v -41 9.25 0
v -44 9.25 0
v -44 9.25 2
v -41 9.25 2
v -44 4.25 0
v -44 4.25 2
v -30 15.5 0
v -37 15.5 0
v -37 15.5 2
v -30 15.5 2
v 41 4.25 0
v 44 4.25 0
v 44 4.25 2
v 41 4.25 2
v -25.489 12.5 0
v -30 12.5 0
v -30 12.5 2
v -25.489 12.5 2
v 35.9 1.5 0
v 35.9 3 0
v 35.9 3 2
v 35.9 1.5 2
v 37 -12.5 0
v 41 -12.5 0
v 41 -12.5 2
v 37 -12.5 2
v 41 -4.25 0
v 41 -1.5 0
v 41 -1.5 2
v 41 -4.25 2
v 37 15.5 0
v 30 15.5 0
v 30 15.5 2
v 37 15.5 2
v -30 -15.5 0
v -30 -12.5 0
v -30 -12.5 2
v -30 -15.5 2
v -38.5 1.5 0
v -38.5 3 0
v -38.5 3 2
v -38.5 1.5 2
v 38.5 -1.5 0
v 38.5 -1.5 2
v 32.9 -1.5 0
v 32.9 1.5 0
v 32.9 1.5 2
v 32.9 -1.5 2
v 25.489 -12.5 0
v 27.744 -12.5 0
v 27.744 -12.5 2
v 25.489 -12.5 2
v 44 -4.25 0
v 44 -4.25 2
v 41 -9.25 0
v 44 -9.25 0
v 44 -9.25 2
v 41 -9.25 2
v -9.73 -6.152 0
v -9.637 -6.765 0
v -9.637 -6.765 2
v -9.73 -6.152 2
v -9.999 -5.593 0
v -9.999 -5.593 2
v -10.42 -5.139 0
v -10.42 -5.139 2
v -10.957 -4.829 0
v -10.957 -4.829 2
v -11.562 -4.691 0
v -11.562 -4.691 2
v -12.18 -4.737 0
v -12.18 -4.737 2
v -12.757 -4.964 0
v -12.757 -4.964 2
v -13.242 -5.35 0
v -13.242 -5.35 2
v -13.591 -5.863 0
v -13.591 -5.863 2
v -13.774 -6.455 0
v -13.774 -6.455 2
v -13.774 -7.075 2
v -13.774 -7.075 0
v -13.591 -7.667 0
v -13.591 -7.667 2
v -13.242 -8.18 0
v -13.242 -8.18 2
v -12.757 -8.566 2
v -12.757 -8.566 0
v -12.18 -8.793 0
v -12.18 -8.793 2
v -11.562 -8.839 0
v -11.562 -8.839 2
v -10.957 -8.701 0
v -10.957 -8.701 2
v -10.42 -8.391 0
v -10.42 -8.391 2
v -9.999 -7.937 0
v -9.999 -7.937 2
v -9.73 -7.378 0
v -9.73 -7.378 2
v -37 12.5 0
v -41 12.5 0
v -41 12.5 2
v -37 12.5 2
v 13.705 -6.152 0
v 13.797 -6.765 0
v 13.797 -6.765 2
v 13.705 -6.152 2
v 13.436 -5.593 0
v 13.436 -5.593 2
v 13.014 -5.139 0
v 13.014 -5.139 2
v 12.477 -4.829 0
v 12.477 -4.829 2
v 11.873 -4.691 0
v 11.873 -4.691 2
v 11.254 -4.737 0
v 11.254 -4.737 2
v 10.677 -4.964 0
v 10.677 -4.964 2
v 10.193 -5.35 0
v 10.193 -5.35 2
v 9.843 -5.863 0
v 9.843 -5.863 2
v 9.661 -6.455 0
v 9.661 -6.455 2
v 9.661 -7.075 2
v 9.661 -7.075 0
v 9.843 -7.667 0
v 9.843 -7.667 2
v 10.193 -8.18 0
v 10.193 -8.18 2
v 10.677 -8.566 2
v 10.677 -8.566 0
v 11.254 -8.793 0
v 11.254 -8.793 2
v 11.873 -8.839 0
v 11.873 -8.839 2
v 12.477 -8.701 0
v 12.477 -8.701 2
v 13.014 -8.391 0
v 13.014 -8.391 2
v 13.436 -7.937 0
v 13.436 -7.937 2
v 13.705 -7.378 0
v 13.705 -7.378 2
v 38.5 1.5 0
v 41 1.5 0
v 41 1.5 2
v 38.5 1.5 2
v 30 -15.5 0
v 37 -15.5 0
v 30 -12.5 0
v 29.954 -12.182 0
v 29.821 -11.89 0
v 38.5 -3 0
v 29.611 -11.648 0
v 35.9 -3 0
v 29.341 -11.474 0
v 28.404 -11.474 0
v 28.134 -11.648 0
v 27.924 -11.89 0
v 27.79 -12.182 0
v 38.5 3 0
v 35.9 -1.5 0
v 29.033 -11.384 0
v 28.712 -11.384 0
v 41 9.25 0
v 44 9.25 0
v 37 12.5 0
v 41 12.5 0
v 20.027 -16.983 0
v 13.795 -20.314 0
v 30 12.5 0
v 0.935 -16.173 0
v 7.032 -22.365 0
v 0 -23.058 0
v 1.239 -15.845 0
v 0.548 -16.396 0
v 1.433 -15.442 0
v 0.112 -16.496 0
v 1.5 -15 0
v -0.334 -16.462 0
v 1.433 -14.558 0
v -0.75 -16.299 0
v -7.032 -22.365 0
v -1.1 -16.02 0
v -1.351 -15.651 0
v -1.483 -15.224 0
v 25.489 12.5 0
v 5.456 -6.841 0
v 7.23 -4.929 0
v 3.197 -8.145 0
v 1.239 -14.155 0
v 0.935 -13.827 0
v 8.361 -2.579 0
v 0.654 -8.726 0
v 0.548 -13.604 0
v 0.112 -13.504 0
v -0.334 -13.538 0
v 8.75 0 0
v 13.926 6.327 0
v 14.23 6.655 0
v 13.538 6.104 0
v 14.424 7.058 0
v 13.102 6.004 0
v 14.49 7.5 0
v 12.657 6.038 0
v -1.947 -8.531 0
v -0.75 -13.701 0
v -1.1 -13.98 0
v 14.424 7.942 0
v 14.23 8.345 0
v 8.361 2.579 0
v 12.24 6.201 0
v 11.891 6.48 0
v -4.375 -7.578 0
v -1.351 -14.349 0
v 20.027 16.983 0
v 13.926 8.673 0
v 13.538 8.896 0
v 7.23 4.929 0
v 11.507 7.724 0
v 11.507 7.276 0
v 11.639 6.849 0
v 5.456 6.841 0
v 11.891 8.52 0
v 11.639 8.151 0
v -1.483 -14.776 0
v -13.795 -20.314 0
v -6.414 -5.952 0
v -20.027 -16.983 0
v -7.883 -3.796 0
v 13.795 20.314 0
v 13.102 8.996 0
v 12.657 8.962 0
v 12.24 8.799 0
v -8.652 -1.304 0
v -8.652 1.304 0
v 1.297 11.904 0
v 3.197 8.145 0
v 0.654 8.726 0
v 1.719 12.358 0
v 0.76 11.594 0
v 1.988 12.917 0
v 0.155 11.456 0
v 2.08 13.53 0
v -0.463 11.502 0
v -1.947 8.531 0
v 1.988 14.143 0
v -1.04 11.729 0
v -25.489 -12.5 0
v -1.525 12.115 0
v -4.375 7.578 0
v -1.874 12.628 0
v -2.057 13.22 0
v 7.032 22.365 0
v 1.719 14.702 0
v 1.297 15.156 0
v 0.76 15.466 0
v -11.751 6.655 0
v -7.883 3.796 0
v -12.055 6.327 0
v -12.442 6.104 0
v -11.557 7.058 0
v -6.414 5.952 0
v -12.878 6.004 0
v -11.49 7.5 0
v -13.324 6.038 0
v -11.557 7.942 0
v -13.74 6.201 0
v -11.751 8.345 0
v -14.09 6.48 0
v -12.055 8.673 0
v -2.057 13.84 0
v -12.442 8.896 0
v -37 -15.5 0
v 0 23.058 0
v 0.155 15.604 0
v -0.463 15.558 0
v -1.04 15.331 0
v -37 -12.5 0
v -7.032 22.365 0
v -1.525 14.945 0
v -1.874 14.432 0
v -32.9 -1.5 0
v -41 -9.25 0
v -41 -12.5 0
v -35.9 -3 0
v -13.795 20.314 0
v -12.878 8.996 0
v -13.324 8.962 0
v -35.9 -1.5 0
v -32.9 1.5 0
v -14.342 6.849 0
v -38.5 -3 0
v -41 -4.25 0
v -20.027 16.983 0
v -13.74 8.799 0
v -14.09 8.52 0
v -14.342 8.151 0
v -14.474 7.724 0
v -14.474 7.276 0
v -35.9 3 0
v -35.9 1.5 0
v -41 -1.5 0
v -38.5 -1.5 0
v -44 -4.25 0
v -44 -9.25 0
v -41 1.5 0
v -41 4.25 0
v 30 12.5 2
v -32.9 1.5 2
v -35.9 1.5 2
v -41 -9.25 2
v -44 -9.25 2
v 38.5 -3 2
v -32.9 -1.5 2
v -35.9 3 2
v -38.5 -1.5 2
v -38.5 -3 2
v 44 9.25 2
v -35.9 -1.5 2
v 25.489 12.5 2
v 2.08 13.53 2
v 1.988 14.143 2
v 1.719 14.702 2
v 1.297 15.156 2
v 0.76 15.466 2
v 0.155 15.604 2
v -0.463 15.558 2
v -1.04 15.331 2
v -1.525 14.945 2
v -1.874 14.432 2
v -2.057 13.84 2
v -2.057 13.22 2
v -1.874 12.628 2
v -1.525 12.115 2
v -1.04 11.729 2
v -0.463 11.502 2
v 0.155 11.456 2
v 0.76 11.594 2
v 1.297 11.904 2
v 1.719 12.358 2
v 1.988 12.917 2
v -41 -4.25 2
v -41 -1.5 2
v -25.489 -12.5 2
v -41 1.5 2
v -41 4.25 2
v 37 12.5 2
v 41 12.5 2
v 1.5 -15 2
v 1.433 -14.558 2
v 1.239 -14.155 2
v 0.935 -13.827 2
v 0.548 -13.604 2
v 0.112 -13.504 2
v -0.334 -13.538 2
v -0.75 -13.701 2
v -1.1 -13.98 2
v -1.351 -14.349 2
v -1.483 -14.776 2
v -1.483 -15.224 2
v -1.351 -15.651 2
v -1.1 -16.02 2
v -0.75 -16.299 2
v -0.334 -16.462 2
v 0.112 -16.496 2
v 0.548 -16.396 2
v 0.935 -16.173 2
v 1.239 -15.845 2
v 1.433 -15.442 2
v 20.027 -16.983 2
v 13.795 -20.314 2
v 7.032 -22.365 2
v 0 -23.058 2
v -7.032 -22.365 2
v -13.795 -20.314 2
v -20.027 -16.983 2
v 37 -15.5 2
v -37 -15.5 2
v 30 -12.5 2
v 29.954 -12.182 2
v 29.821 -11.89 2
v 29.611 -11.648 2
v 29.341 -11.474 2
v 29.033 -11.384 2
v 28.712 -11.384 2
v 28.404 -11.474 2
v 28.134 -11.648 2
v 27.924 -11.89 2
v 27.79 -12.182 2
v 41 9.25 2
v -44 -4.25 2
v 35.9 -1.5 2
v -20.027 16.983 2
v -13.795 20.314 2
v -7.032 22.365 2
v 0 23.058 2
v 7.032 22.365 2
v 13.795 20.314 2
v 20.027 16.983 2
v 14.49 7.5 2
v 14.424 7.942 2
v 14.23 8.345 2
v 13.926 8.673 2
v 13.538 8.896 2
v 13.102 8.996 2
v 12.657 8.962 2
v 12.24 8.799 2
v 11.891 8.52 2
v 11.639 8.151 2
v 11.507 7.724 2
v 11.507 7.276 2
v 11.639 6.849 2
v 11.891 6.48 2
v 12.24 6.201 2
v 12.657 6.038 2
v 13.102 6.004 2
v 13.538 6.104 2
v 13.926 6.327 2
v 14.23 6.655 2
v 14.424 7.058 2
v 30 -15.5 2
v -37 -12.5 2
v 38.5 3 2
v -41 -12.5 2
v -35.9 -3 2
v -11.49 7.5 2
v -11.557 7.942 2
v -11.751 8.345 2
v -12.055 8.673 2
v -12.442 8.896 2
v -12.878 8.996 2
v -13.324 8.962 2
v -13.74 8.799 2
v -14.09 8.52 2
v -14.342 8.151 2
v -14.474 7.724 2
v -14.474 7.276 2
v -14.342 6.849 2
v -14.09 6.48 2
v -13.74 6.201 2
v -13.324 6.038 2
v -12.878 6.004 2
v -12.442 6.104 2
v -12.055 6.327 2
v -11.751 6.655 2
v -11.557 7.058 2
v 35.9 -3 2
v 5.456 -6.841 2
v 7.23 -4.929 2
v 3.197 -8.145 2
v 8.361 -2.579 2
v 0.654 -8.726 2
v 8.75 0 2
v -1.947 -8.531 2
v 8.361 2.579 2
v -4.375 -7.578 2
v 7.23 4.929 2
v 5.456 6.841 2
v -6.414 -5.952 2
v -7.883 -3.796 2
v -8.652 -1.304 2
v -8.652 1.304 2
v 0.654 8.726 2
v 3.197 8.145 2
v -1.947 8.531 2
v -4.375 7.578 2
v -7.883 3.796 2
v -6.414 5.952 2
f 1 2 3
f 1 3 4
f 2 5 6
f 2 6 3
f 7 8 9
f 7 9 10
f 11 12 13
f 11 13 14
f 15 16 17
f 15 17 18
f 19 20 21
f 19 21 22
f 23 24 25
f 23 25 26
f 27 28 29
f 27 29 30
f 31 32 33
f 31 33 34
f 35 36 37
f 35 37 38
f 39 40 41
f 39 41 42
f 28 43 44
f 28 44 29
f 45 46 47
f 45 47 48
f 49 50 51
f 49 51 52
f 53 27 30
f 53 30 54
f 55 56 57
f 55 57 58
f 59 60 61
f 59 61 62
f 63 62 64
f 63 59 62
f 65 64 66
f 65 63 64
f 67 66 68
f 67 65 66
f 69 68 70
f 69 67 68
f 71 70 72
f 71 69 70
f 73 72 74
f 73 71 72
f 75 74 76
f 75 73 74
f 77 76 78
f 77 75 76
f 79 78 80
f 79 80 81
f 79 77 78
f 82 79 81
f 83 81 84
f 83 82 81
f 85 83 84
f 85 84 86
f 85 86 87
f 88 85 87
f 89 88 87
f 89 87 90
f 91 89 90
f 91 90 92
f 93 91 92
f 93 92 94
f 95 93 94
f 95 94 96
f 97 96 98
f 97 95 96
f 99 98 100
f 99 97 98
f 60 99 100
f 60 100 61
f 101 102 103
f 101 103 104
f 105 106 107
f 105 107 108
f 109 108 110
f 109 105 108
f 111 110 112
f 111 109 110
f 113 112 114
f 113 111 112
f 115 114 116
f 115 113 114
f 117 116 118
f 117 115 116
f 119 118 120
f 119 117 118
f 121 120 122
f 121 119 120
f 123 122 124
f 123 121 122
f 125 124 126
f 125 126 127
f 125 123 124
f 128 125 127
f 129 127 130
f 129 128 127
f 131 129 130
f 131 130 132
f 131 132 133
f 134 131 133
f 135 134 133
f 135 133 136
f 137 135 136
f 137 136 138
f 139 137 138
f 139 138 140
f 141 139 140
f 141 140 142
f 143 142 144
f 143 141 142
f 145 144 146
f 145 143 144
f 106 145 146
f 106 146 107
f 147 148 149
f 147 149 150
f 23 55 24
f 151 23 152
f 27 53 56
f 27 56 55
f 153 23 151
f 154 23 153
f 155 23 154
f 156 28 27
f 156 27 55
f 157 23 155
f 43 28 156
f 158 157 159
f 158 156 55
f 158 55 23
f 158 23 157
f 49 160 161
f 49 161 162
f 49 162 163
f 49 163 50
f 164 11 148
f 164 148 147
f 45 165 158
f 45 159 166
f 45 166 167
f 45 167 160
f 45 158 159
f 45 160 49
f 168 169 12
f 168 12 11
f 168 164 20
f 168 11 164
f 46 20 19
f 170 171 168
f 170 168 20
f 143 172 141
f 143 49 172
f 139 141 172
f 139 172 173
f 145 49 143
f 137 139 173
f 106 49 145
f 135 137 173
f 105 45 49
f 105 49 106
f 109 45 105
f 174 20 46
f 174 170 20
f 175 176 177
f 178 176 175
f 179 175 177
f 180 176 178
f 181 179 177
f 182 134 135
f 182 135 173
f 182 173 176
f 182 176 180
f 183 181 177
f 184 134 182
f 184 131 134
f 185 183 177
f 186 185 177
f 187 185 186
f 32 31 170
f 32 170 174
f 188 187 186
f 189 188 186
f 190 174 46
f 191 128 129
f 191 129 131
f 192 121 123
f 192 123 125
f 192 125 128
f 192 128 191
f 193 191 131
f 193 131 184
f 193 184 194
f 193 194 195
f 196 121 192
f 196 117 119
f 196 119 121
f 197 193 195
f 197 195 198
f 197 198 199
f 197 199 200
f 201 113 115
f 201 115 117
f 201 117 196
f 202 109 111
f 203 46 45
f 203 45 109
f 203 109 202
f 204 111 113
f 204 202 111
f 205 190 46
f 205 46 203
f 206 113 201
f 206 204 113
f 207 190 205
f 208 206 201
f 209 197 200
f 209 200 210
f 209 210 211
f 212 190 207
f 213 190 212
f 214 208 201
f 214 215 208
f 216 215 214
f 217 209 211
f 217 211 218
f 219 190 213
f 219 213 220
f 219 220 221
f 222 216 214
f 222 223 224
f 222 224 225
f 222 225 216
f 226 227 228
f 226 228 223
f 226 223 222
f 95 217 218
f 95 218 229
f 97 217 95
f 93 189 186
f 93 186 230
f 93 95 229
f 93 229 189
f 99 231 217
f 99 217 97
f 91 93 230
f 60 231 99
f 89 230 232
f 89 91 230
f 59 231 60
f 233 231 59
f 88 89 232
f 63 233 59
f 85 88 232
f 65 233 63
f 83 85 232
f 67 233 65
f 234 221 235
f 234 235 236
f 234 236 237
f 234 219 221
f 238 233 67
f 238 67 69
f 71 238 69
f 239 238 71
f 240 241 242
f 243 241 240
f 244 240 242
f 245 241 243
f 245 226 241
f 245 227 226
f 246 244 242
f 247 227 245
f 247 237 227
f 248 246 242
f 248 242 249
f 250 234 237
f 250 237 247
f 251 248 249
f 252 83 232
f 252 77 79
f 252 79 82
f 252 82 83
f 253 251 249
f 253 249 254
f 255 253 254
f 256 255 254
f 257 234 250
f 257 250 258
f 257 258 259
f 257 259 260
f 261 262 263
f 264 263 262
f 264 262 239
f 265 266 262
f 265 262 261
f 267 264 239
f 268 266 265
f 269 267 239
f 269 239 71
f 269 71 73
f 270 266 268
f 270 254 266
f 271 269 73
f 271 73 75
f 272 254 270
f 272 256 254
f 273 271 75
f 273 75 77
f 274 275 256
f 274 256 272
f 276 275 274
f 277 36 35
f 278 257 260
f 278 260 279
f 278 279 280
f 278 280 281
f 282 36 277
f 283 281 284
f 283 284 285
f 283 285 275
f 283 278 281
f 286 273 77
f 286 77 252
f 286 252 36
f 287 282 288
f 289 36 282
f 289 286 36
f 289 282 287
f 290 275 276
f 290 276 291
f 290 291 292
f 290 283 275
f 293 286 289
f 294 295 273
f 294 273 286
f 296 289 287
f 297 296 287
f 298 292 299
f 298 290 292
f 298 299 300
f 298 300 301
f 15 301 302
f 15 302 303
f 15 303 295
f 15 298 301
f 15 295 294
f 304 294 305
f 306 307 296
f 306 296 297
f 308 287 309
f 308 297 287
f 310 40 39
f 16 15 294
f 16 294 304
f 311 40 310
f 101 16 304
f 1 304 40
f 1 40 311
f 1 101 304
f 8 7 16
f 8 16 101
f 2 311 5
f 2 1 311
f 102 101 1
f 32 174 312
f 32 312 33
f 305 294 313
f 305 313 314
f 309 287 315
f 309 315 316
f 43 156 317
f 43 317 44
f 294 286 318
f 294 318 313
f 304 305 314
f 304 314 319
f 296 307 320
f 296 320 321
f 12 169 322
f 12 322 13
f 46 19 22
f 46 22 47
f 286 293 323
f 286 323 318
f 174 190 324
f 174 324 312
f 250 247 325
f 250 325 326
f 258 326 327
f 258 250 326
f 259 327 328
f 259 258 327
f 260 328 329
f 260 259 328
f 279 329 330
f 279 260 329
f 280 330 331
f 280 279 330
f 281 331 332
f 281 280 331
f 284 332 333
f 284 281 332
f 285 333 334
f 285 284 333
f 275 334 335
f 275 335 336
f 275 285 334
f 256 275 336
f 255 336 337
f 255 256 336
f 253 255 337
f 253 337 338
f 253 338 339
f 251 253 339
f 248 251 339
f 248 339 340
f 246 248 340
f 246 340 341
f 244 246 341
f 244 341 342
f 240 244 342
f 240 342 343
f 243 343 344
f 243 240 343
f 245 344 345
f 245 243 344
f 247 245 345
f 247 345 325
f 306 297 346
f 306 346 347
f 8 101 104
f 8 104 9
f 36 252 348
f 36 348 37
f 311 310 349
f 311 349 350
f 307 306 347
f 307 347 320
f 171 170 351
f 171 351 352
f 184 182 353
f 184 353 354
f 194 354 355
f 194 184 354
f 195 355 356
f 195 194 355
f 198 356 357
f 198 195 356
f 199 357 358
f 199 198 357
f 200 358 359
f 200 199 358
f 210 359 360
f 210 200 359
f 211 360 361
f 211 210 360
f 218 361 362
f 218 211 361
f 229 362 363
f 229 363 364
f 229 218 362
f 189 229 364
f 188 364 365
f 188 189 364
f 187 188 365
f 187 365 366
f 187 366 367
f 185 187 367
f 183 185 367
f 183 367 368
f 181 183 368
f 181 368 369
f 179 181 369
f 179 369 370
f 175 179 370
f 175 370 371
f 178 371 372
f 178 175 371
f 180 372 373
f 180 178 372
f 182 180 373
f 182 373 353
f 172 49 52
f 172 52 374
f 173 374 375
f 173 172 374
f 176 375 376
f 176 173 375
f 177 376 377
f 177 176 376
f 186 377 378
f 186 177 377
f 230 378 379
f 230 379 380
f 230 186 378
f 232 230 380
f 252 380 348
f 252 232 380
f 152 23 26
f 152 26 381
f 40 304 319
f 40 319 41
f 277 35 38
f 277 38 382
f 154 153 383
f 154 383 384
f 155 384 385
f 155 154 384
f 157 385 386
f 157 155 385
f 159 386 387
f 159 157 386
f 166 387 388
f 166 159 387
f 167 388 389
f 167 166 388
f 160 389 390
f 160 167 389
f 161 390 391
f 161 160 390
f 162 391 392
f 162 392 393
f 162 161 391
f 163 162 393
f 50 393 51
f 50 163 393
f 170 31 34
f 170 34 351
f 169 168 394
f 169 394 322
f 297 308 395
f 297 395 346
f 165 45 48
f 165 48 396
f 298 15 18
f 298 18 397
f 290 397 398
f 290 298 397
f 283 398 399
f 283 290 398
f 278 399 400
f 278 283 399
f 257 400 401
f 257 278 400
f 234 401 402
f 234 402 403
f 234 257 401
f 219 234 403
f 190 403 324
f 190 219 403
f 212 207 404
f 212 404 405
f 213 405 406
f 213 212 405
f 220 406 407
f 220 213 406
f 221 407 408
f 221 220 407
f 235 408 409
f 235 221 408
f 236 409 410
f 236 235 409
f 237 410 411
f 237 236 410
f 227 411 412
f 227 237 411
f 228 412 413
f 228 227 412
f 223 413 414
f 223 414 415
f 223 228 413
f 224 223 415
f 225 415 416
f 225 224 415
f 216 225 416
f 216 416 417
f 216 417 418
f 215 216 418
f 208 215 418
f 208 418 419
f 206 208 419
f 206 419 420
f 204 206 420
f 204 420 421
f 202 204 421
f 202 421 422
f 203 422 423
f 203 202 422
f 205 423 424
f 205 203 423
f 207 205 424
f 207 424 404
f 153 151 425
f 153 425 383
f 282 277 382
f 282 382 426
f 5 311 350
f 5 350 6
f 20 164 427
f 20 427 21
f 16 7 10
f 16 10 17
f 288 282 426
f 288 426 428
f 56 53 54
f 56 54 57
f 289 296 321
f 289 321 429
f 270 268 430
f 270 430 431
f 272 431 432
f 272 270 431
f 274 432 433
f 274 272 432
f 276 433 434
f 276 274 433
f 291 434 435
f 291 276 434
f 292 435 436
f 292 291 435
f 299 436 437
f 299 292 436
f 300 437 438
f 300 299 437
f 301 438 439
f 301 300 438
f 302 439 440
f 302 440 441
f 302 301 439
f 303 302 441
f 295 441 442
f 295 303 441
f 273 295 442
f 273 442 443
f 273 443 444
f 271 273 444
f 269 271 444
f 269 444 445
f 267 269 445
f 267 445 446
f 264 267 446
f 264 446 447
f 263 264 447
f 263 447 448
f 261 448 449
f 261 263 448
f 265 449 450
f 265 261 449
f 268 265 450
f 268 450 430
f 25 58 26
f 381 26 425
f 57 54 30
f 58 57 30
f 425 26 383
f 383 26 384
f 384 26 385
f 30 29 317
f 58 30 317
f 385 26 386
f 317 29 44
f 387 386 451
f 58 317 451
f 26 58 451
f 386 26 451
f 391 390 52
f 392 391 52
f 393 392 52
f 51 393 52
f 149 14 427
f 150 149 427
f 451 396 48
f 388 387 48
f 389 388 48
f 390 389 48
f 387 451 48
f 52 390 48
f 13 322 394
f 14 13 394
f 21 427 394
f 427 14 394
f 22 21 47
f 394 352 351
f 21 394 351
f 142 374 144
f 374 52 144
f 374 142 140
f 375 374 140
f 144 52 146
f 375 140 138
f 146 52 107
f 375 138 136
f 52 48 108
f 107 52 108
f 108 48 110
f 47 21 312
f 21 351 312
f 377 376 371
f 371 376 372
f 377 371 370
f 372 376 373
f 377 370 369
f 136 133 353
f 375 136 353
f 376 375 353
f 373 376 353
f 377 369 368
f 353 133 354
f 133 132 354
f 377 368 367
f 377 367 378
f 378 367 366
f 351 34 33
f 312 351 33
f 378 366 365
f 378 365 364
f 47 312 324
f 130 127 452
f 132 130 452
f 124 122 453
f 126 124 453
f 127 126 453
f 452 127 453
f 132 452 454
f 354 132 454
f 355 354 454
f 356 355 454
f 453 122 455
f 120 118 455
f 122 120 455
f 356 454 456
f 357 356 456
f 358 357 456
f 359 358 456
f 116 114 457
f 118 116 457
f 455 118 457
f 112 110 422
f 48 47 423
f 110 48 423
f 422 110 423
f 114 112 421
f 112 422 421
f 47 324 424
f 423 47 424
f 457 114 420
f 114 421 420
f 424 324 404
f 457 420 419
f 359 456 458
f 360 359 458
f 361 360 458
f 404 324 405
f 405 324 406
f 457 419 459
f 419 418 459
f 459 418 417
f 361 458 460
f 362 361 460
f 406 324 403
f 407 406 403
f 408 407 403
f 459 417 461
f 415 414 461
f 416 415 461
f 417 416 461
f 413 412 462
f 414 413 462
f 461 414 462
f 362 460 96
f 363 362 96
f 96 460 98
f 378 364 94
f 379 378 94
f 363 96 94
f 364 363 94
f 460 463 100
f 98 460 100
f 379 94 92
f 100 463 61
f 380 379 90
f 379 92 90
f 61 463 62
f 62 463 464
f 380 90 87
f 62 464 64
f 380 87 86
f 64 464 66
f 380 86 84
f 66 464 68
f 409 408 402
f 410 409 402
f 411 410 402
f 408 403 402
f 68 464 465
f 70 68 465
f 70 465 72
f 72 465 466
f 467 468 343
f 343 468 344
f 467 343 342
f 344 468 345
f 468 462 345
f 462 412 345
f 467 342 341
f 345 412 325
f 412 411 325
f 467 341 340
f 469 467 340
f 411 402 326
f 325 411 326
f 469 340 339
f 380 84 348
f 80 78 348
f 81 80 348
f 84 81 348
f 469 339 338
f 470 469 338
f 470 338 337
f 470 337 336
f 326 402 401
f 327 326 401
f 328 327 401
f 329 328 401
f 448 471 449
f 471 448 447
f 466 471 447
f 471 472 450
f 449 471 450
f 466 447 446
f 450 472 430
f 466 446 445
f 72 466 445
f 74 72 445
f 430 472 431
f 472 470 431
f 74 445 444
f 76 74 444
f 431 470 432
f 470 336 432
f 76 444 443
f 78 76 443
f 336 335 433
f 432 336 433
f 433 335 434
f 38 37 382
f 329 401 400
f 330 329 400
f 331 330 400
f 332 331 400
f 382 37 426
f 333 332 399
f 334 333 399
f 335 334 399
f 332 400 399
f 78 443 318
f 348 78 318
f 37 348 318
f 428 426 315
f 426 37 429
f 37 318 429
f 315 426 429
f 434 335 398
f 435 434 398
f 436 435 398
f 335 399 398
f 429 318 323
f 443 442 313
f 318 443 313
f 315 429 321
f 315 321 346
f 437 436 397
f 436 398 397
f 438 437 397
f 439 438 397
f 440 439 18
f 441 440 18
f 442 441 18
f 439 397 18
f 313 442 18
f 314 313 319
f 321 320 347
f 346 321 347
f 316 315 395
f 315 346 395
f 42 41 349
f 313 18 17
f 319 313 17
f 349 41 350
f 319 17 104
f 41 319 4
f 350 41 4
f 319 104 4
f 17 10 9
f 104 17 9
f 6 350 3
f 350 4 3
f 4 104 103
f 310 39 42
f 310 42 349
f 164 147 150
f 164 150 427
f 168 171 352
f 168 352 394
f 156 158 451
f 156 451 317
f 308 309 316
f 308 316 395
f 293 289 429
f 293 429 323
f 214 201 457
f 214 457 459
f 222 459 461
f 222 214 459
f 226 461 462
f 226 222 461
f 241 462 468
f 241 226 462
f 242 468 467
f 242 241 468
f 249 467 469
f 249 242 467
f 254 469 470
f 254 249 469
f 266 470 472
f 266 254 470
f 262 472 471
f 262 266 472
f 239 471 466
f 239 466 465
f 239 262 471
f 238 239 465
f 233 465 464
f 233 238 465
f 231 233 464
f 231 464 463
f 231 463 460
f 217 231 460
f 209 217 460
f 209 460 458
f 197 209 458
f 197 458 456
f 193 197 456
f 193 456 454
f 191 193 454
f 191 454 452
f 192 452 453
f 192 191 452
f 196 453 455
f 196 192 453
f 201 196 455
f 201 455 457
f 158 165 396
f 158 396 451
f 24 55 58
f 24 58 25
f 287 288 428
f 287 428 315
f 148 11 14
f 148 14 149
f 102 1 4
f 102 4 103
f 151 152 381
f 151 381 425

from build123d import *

# Parameters (mm, degrees)
SKETCH_1_R      = 2.08
SKETCH_1_R_2    = 8.75
SKETCH_1_R_3    = 1.5
EXTRUDE_2_DEPTH = 2


with BuildPart() as part:
    # 草图1 → 凸台-拉伸2 (new body)
    with BuildSketch(Plane.XY):
        with BuildLine():
            Line((25.488968202, 12.5), (30, 12.5))
            Line((30, 12.5), (30, 15.5))
            Line((30, 15.5), (37, 15.5))
            Line((37, 15.5), (37, 12.5))
            Line((37, 12.5), (41, 12.5))
            Line((41, 12.5), (41, 9.25))
            Line((41, 9.25), (44, 9.25))
            Line((44, 9.25), (44, 4.25))
            Line((44, 4.25), (41, 4.25))
            Line((41, 4.25), (41, 1.5))
            Line((41, 1.5), (38.5, 1.5))
            Line((38.5, 1.5), (38.5, 3))
            Line((38.5, 3), (35.9, 3))
            Line((35.9, 3), (35.9, 1.5))
            Line((35.9, 1.5), (32.9, 1.5))
            Line((32.9, 1.5), (32.9, -1.5))
            Line((32.9, -1.5), (35.9, -1.5))
            Line((35.9, -1.5), (35.9, -3))
            Line((35.9, -3), (38.5, -3))
            Line((38.5, -3), (38.5, -1.5))
            Line((38.5, -1.5), (41, -1.5))
            Line((41, -1.5), (41, -4.25))
            Line((41, -4.25), (44, -4.25))
            Line((44, -4.25), (44, -9.25))
            Line((44, -9.25), (41, -9.25))
            Line((41, -9.25), (41, -12.5))
            Line((41, -12.5), (37, -12.5))
            Line((37, -12.5), (37, -15.5))
            Line((37, -15.5), (30, -15.5))
            Line((30, -15.5), (30, -12.5))
            ThreePointArc((30, -12.5), (28.87224205, -11.37224205), (27.744484101, -12.5))
            Line((27.744484101, -12.5), (25.488968202, -12.5))
            ThreePointArc((25.488968202, -12.5), (0, -23.05787632), (-25.488968202, -12.5))
            Line((-25.488968202, -12.5), (-30, -12.5))
            Line((-30, -12.5), (-30, -15.5))
            Line((-30, -15.5), (-37, -15.5))
            Line((-37, -15.5), (-37, -12.5))
            Line((-37, -12.5), (-41, -12.5))
            Line((-41, -12.5), (-41, -9.25))
            Line((-41, -9.25), (-44, -9.25))
            Line((-44, -9.25), (-44, -4.25))
            Line((-44, -4.25), (-41, -4.25))
            Line((-41, -4.25), (-41, -1.5))
            Line((-41, -1.5), (-38.5, -1.5))
            Line((-38.5, -1.5), (-38.5, -3))
            Line((-38.5, -3), (-35.9, -3))
            Line((-35.9, -3), (-35.9, -1.5))
            Line((-35.9, -1.5), (-32.9, -1.5))
            Line((-32.9, -1.5), (-32.9, 1.5))
            Line((-32.9, 1.5), (-35.9, 1.5))
            Line((-35.9, 1.5), (-35.9, 3))
            Line((-35.9, 3), (-38.5, 3))
            Line((-38.5, 3), (-38.5, 1.5))
            Line((-38.5, 1.5), (-41, 1.5))
            Line((-41, 1.5), (-41, 4.25))
            Line((-41, 4.25), (-44, 4.25))
            Line((-44, 4.25), (-44, 9.25))
            Line((-44, 9.25), (-41, 9.25))
            Line((-41, 9.25), (-41, 12.5))
            Line((-41, 12.5), (-37, 12.5))
            Line((-37, 12.5), (-37, 15.5))
            Line((-37, 15.5), (-30, 15.5))
            Line((-30, 15.5), (-30, 12.5))
            Line((-30, 12.5), (-25.488968202, 12.5))
            ThreePointArc((-25.488968202, 12.5), (0, 23.05787632), (25.488968202, 12.5))
        make_face()
        with Locations((0, 13.53)):
            Circle(SKETCH_1_R, mode=Mode.SUBTRACT)
        with Locations((11.717323713, -6.765)):
            Circle(SKETCH_1_R, mode=Mode.SUBTRACT)
        with Locations((-11.717323713, -6.765)):
            Circle(SKETCH_1_R, mode=Mode.SUBTRACT)
        Circle(SKETCH_1_R_2, mode=Mode.SUBTRACT)
        with Locations((-12.990381057, 7.5)):
            Circle(SKETCH_1_R_3, mode=Mode.SUBTRACT)
        with Locations((12.990381057, 7.5)):
            Circle(SKETCH_1_R_3, mode=Mode.SUBTRACT)
        with Locations((0, -15)):
            Circle(SKETCH_1_R_3, mode=Mode.SUBTRACT)
    extrude(amount=EXTRUDE_2_DEPTH)


solid = part.part
